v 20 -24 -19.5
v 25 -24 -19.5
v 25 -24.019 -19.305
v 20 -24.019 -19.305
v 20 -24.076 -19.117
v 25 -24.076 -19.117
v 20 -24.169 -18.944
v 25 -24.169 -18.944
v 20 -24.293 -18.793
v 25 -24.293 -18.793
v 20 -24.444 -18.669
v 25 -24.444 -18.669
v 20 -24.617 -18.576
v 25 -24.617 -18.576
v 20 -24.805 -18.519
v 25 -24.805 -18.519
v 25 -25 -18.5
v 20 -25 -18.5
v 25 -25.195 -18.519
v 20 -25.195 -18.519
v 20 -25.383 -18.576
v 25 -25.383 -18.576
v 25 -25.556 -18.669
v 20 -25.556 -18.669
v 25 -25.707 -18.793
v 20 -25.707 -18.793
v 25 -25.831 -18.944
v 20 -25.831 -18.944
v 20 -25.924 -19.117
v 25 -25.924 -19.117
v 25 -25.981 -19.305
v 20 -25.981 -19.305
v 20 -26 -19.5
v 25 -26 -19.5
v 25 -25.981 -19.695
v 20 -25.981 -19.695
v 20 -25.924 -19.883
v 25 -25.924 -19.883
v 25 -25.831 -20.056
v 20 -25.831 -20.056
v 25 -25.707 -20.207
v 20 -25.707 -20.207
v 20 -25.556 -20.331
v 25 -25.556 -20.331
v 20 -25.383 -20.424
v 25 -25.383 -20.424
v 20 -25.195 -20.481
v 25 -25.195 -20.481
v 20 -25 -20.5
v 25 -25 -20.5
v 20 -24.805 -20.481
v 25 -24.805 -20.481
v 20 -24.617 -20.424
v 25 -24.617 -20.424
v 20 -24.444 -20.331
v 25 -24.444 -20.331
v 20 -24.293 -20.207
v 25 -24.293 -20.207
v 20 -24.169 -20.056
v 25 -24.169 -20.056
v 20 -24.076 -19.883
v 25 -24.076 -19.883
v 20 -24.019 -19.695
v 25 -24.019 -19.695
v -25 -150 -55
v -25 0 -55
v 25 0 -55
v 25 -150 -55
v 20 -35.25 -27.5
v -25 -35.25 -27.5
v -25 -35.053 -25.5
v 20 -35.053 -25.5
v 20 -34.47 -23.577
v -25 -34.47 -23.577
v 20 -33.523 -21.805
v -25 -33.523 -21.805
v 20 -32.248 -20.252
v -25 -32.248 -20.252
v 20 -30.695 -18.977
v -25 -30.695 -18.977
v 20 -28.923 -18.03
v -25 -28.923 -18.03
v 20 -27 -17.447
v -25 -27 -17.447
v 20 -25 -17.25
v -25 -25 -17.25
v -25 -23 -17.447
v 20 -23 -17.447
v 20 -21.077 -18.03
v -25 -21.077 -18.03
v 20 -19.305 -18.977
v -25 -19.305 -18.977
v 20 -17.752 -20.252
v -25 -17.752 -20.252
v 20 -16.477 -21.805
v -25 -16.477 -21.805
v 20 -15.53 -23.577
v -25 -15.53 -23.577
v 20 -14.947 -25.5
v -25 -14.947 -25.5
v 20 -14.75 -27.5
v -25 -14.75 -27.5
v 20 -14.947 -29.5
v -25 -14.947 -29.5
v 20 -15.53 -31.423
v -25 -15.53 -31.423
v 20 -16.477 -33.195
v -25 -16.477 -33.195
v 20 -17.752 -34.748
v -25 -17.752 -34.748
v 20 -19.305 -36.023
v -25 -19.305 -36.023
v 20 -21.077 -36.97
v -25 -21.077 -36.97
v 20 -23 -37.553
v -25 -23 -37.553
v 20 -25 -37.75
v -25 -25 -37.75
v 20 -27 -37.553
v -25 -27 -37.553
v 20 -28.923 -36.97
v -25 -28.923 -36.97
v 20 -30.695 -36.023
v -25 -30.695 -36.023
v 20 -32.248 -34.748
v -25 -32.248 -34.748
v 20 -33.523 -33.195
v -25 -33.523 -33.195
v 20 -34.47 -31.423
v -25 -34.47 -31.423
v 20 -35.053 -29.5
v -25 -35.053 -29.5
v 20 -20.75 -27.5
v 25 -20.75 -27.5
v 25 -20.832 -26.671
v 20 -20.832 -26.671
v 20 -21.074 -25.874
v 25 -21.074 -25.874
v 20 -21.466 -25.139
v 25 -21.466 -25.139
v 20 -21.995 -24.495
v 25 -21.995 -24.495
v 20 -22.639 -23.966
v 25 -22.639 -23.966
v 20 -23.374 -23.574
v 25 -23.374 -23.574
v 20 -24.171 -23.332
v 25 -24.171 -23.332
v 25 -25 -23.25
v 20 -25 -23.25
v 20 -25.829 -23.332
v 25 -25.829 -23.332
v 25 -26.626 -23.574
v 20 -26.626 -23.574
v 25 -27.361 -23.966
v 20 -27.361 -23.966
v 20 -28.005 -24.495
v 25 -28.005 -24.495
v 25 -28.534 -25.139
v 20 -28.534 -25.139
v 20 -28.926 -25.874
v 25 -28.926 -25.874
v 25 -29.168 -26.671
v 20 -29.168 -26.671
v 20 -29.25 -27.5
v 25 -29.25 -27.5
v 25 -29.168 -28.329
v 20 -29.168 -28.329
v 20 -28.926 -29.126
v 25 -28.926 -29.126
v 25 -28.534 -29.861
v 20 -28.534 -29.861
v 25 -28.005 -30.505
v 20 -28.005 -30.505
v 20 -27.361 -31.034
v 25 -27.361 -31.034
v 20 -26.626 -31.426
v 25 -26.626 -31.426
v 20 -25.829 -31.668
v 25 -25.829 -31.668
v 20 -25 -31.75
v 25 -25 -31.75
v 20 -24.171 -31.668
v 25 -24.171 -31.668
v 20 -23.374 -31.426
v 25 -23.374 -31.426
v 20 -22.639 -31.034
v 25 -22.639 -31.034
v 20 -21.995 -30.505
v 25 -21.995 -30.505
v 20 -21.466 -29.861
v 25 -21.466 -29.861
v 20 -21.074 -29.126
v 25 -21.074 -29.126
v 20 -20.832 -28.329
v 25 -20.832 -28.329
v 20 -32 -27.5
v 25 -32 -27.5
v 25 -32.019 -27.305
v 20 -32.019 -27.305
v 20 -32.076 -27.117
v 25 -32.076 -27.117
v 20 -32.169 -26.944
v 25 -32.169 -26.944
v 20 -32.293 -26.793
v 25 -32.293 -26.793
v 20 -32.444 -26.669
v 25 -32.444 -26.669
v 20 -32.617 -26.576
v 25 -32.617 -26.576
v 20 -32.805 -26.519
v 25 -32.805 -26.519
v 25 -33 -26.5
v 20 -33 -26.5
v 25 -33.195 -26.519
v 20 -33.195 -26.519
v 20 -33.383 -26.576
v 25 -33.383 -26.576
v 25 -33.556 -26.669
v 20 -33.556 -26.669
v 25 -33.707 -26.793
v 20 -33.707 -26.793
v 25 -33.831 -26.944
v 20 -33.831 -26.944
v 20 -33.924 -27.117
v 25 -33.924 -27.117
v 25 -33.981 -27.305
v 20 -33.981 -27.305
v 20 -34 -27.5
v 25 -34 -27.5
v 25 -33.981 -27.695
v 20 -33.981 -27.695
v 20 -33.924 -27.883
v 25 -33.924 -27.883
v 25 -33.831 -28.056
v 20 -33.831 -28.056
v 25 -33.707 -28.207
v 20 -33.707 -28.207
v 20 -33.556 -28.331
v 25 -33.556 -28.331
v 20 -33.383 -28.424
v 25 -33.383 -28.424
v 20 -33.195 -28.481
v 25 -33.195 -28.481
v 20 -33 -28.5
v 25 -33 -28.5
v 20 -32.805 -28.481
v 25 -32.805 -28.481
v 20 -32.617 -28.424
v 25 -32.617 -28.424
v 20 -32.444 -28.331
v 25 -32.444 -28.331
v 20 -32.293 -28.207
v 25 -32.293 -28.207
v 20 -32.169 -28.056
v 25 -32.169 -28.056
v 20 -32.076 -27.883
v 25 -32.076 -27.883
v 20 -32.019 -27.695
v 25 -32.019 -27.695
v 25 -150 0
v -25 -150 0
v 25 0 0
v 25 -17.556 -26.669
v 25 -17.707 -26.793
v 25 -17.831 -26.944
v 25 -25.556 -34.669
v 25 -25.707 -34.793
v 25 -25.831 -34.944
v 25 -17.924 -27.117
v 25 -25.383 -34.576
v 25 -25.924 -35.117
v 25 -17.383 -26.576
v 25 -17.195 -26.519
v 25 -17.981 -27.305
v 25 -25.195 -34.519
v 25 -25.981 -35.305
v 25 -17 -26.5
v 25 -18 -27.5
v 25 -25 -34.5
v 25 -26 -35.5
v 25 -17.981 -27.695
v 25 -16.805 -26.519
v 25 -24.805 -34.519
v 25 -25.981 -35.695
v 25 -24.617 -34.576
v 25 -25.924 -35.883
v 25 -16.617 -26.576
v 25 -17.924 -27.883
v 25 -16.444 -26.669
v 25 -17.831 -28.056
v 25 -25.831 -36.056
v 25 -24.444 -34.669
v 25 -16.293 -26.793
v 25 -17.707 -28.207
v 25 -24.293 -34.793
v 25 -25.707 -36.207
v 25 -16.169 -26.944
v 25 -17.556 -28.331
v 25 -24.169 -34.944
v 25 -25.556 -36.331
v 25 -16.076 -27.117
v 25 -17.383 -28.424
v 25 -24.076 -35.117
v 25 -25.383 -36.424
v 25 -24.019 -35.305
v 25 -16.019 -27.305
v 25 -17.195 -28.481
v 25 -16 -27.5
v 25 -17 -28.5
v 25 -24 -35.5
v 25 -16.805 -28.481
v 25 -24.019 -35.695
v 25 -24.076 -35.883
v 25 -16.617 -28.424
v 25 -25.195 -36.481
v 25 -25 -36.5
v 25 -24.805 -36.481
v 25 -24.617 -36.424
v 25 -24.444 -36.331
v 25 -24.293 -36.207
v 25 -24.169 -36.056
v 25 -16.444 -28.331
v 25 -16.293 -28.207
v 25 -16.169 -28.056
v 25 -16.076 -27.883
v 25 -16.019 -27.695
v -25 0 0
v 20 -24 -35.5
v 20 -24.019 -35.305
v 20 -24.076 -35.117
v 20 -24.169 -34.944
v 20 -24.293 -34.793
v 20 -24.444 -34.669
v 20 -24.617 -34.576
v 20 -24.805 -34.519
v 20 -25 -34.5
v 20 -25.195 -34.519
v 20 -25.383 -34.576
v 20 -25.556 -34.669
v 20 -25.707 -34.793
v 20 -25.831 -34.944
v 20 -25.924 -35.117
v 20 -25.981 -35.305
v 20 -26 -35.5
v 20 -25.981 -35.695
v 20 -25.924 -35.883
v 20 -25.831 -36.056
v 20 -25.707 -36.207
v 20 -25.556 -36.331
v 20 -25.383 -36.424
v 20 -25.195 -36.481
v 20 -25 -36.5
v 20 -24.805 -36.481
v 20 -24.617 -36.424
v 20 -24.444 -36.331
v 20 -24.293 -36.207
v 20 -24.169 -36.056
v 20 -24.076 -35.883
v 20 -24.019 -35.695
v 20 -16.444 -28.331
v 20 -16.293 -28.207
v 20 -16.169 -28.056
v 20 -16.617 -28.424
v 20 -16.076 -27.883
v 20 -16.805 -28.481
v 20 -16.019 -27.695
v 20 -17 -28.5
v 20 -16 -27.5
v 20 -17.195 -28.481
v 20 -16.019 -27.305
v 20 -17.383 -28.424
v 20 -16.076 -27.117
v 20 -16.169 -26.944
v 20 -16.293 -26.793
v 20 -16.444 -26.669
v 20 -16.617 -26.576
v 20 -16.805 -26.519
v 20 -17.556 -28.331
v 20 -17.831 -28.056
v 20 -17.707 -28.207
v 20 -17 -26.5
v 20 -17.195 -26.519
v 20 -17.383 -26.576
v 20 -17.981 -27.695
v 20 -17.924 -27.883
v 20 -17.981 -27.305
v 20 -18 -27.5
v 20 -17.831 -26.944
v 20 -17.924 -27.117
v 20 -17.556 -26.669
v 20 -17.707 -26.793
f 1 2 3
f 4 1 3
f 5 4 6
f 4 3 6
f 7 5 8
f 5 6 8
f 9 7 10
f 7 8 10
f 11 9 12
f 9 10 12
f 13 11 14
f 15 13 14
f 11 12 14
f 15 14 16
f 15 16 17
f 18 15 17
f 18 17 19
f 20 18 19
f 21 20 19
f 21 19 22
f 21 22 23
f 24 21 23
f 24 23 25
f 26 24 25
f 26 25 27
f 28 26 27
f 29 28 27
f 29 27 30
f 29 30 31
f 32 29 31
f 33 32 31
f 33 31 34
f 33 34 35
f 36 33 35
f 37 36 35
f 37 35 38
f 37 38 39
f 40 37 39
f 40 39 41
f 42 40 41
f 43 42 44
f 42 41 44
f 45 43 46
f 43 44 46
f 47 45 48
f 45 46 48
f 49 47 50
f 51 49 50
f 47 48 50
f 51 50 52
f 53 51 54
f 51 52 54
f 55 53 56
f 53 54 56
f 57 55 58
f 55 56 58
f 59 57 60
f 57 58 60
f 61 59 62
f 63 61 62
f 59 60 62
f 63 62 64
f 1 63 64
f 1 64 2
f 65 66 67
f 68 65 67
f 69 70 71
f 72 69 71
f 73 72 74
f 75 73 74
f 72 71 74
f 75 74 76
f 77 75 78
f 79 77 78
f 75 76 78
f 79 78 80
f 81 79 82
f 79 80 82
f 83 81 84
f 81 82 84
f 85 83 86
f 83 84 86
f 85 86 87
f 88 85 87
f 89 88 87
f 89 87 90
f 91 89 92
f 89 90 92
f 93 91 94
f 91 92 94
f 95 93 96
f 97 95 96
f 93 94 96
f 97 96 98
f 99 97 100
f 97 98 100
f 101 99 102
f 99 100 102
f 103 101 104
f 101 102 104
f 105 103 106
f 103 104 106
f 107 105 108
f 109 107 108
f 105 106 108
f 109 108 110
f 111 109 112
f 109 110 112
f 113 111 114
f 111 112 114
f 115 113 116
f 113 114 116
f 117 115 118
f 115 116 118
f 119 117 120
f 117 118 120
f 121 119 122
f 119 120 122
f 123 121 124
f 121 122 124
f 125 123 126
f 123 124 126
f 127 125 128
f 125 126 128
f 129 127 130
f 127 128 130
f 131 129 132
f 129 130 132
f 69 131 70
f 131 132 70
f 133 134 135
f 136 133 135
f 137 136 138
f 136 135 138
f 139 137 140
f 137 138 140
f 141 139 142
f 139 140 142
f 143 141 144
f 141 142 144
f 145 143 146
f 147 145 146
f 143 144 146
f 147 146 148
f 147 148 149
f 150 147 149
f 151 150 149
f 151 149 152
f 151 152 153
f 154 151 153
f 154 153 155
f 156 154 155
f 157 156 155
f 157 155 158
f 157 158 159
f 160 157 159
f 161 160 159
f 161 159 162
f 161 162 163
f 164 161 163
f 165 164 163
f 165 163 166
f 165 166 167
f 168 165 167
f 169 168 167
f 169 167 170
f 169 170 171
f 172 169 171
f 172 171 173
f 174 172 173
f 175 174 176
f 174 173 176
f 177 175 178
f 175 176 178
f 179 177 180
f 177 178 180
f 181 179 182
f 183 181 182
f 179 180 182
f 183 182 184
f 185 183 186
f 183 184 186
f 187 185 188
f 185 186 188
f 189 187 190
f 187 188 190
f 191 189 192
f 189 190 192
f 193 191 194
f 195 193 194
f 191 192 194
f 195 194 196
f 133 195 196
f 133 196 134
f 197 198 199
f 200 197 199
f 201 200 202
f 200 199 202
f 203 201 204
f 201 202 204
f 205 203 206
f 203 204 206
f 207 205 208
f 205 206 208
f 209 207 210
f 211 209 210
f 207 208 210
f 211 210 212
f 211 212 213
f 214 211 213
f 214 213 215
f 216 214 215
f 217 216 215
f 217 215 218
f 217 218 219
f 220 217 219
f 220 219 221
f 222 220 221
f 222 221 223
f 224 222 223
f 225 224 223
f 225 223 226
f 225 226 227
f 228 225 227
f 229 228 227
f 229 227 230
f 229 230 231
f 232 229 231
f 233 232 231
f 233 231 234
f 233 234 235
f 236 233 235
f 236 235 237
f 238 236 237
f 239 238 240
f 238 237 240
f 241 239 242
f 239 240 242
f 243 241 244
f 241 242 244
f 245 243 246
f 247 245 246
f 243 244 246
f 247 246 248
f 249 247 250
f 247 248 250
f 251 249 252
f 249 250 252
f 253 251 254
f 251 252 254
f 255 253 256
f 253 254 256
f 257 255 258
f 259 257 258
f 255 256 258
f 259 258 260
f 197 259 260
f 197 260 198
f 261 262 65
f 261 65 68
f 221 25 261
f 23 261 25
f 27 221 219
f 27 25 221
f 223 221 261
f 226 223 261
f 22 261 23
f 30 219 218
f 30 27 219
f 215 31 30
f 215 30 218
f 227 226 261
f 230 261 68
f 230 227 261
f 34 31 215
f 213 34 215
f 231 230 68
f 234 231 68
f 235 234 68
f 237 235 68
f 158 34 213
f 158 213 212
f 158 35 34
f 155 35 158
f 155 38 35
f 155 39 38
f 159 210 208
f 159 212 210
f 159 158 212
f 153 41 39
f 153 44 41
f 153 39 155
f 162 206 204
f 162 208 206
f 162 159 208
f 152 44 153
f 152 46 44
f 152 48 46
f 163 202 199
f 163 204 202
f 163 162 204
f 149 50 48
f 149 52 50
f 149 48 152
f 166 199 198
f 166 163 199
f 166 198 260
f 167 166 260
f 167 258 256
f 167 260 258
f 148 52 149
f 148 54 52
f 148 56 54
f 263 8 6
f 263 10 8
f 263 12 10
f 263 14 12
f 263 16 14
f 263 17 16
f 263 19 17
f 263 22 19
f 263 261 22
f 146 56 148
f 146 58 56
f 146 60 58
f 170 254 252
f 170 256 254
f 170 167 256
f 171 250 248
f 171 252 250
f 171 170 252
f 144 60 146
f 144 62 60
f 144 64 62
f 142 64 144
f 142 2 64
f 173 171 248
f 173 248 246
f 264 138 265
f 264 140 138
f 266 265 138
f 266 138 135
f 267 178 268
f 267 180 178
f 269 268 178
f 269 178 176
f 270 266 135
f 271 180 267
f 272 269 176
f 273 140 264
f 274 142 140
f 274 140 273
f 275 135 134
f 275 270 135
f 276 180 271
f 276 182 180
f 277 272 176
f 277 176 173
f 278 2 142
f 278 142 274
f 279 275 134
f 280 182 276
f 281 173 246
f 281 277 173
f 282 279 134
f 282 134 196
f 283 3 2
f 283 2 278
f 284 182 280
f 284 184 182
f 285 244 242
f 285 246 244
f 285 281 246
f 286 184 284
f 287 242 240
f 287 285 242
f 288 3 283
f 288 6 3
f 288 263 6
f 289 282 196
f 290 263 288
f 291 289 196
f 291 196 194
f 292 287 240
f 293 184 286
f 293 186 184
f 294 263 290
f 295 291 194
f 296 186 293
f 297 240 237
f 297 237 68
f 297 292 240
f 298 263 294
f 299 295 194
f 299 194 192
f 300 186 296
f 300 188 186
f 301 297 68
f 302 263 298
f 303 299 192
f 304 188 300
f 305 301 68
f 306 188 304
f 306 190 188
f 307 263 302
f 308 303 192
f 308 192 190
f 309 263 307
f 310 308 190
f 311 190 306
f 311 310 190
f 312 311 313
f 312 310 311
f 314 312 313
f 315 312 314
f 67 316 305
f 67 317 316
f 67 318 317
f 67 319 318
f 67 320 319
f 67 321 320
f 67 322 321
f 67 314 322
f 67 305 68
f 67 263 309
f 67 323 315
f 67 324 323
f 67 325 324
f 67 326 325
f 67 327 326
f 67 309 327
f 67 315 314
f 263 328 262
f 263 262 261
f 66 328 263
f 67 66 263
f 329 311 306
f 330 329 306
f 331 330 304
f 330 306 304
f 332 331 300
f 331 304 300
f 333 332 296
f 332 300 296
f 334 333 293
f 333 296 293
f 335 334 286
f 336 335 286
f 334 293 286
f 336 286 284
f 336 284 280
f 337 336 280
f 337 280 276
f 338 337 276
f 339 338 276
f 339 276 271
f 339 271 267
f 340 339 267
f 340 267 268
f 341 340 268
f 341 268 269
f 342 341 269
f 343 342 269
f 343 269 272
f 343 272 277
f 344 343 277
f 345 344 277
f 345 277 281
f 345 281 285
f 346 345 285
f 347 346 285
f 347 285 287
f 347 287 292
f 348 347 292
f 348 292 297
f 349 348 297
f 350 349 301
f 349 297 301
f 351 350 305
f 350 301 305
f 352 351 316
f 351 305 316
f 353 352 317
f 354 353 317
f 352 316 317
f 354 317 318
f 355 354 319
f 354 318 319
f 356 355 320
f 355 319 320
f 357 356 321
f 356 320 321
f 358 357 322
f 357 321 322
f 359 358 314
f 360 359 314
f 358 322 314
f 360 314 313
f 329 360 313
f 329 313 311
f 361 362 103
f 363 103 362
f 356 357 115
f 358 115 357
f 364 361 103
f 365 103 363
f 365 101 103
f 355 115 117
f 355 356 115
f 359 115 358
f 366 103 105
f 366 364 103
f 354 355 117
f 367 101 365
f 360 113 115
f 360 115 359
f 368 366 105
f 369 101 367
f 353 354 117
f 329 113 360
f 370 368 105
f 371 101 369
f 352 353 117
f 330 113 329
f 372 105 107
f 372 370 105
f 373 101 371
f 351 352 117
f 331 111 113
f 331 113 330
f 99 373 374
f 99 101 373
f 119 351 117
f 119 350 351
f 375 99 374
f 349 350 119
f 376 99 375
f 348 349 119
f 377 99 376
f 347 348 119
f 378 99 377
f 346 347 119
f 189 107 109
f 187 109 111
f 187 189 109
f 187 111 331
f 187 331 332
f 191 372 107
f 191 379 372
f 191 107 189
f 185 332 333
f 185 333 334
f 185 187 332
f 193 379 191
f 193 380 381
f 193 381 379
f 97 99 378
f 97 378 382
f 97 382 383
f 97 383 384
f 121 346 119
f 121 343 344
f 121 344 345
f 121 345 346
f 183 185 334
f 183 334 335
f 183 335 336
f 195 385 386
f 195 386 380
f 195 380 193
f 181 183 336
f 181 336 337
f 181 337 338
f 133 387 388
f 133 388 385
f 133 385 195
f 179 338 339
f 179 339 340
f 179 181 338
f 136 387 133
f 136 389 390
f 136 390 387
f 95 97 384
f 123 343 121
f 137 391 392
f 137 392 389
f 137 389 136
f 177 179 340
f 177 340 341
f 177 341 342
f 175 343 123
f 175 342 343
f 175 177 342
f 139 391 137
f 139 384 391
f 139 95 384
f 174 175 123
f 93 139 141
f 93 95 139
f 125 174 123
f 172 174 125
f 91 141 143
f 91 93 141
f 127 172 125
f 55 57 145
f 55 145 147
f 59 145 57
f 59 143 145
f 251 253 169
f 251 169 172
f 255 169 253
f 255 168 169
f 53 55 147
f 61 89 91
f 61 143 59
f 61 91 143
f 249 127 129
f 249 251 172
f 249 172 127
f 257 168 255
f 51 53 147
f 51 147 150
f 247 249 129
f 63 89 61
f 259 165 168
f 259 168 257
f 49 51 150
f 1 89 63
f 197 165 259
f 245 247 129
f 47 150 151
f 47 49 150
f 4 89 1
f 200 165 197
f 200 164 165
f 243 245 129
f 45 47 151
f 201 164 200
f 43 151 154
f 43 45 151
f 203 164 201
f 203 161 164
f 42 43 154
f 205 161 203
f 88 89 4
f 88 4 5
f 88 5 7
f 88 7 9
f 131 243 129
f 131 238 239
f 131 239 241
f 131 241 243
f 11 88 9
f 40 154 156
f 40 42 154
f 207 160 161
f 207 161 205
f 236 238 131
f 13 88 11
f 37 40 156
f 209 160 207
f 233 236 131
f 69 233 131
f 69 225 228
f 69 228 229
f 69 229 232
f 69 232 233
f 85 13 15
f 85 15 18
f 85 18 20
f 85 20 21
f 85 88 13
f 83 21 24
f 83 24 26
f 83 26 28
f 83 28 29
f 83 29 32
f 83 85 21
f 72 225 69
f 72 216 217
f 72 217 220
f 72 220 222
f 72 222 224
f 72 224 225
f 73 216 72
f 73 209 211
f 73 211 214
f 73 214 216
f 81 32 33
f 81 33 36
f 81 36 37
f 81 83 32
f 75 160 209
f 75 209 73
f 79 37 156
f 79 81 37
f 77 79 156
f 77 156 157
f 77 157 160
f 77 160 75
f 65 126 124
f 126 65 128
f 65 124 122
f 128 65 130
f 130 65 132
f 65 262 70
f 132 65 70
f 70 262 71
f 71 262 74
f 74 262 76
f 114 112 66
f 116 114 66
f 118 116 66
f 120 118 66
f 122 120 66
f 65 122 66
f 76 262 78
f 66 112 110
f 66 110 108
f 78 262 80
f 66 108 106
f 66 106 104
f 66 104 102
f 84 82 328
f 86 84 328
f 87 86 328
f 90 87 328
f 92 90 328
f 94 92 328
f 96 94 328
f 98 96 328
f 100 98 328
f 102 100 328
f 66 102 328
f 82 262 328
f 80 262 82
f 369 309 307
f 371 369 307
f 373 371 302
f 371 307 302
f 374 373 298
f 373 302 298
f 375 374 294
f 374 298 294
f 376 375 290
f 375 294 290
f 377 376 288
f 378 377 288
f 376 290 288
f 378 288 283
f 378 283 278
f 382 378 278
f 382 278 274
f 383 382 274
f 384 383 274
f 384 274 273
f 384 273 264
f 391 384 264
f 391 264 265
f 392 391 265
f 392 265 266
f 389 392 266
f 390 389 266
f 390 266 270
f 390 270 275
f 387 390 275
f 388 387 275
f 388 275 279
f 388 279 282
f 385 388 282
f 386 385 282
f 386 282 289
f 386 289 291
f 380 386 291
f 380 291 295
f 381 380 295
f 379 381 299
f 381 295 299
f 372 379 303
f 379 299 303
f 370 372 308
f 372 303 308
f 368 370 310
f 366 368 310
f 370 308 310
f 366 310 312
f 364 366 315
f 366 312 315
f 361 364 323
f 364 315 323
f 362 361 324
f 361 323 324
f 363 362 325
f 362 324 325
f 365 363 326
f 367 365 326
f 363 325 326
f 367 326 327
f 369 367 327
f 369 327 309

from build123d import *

# Parameters (mm, degrees)
SKETCH1_W               = 50
SKETCH1_H               = 150
BOSS_EXTRUDE1_DEPTH     = 55
CUT_EXTRUDE1_DEPTH      = 168.406690428
CUT_EXTRUDE1_DEPTH_BACK = 45
SKETCH2_R               = 10.25
SKETCH7_R               = 1
SKETCH7_R_2             = 4.25
CUT_EXTRUDE3_DEPTH      = 10
BOSS_EXTRUDE2_START     = 45
SKETCH8_R               = 10.25
SKETCH8_R_2             = 1
SKETCH8_R_3             = 4.25
BOSS_EXTRUDE2_DEPTH     = 45
SKETCH9_R               = 10.25
CUT_EXTRUDE4_DEPTH      = 45


with BuildPart() as part:
    # Sketch1 → Boss-Extrude1 (new body)
    with BuildSketch(Plane.XY):
        with Locations((0, -75)):
            Rectangle(SKETCH1_W, SKETCH1_H)
    extrude(amount=-BOSS_EXTRUDE1_DEPTH)

    # Sketch2 → Cut-Extrude1 (cut, two sides: drawn at the far end of the back side and taken through both)
    with BuildSketch(Plane(origin=(25, 0, 0), x_dir=(0, 0, -1), z_dir=(1, 0, 0)).offset(-CUT_EXTRUDE1_DEPTH_BACK)):
        with Locations(Location((27.5, -25, 0), (0, 0, 270))):
            Circle(SKETCH2_R)
    extrude(amount=CUT_EXTRUDE1_DEPTH + CUT_EXTRUDE1_DEPTH_BACK, mode=Mode.SUBTRACT)

    # Sketch7 → Cut-Extrude3 (cut)
    with BuildSketch(Plane(origin=(-20, 0, 0), x_dir=(0, 0, -1), z_dir=(1, 0, 0))):
        with Locations(Location((27.5, -17, 0), (0, 0, 90))):
            Circle(SKETCH7_R)
        with Locations(Location((35.5, -25, 0), (0, 0, 90))):
            Circle(SKETCH7_R)
        with Locations(Location((27.5, -33, 0), (0, 0, 90))):
            Circle(SKETCH7_R)
        with Locations(Location((19.5, -25, 0), (0, 0, 90))):
            Circle(SKETCH7_R)
        with Locations(Location((27.5, -25, 0), (0, 0, 90))):
            Circle(SKETCH7_R_2)
    extrude(amount=-CUT_EXTRUDE3_DEPTH, mode=Mode.SUBTRACT)

    # Sketch8 → Boss-Extrude2 (add)
    with BuildSketch(Plane(origin=(-20, 0, 0), x_dir=(0, 0, -1), z_dir=(1, 0, 0)).offset(BOSS_EXTRUDE2_START)):
        with Locations((27.5, -25)):
            Circle(SKETCH8_R)
        with Locations(Location((27.5, -17, 0), (0, 0, 90))):
            Circle(SKETCH8_R_2, mode=Mode.SUBTRACT)
        with Locations(Location((27.5, -25, 0), (0, 0, 90))):
            Circle(SKETCH8_R_3, mode=Mode.SUBTRACT)
        with Locations(Location((35.5, -25, 0), (0, 0, 90))):
            Circle(SKETCH8_R_2, mode=Mode.SUBTRACT)
        with Locations(Location((27.5, -33, 0), (0, 0, 90))):
            Circle(SKETCH8_R_2, mode=Mode.SUBTRACT)
        with Locations(Location((19.5, -25, 0), (0, 0, 90))):
            Circle(SKETCH8_R_2, mode=Mode.SUBTRACT)
    extrude(amount=-BOSS_EXTRUDE2_DEPTH)

    # Sketch9 → Cut-Extrude4 (cut)
    with BuildSketch(Plane.ZY.offset(25)):
        with Locations(Location((-27.5, -25, 0), (0, 0, 270))):
            Circle(SKETCH9_R)
    extrude(amount=-CUT_EXTRUDE4_DEPTH, mode=Mode.SUBTRACT)


solid = part.part
